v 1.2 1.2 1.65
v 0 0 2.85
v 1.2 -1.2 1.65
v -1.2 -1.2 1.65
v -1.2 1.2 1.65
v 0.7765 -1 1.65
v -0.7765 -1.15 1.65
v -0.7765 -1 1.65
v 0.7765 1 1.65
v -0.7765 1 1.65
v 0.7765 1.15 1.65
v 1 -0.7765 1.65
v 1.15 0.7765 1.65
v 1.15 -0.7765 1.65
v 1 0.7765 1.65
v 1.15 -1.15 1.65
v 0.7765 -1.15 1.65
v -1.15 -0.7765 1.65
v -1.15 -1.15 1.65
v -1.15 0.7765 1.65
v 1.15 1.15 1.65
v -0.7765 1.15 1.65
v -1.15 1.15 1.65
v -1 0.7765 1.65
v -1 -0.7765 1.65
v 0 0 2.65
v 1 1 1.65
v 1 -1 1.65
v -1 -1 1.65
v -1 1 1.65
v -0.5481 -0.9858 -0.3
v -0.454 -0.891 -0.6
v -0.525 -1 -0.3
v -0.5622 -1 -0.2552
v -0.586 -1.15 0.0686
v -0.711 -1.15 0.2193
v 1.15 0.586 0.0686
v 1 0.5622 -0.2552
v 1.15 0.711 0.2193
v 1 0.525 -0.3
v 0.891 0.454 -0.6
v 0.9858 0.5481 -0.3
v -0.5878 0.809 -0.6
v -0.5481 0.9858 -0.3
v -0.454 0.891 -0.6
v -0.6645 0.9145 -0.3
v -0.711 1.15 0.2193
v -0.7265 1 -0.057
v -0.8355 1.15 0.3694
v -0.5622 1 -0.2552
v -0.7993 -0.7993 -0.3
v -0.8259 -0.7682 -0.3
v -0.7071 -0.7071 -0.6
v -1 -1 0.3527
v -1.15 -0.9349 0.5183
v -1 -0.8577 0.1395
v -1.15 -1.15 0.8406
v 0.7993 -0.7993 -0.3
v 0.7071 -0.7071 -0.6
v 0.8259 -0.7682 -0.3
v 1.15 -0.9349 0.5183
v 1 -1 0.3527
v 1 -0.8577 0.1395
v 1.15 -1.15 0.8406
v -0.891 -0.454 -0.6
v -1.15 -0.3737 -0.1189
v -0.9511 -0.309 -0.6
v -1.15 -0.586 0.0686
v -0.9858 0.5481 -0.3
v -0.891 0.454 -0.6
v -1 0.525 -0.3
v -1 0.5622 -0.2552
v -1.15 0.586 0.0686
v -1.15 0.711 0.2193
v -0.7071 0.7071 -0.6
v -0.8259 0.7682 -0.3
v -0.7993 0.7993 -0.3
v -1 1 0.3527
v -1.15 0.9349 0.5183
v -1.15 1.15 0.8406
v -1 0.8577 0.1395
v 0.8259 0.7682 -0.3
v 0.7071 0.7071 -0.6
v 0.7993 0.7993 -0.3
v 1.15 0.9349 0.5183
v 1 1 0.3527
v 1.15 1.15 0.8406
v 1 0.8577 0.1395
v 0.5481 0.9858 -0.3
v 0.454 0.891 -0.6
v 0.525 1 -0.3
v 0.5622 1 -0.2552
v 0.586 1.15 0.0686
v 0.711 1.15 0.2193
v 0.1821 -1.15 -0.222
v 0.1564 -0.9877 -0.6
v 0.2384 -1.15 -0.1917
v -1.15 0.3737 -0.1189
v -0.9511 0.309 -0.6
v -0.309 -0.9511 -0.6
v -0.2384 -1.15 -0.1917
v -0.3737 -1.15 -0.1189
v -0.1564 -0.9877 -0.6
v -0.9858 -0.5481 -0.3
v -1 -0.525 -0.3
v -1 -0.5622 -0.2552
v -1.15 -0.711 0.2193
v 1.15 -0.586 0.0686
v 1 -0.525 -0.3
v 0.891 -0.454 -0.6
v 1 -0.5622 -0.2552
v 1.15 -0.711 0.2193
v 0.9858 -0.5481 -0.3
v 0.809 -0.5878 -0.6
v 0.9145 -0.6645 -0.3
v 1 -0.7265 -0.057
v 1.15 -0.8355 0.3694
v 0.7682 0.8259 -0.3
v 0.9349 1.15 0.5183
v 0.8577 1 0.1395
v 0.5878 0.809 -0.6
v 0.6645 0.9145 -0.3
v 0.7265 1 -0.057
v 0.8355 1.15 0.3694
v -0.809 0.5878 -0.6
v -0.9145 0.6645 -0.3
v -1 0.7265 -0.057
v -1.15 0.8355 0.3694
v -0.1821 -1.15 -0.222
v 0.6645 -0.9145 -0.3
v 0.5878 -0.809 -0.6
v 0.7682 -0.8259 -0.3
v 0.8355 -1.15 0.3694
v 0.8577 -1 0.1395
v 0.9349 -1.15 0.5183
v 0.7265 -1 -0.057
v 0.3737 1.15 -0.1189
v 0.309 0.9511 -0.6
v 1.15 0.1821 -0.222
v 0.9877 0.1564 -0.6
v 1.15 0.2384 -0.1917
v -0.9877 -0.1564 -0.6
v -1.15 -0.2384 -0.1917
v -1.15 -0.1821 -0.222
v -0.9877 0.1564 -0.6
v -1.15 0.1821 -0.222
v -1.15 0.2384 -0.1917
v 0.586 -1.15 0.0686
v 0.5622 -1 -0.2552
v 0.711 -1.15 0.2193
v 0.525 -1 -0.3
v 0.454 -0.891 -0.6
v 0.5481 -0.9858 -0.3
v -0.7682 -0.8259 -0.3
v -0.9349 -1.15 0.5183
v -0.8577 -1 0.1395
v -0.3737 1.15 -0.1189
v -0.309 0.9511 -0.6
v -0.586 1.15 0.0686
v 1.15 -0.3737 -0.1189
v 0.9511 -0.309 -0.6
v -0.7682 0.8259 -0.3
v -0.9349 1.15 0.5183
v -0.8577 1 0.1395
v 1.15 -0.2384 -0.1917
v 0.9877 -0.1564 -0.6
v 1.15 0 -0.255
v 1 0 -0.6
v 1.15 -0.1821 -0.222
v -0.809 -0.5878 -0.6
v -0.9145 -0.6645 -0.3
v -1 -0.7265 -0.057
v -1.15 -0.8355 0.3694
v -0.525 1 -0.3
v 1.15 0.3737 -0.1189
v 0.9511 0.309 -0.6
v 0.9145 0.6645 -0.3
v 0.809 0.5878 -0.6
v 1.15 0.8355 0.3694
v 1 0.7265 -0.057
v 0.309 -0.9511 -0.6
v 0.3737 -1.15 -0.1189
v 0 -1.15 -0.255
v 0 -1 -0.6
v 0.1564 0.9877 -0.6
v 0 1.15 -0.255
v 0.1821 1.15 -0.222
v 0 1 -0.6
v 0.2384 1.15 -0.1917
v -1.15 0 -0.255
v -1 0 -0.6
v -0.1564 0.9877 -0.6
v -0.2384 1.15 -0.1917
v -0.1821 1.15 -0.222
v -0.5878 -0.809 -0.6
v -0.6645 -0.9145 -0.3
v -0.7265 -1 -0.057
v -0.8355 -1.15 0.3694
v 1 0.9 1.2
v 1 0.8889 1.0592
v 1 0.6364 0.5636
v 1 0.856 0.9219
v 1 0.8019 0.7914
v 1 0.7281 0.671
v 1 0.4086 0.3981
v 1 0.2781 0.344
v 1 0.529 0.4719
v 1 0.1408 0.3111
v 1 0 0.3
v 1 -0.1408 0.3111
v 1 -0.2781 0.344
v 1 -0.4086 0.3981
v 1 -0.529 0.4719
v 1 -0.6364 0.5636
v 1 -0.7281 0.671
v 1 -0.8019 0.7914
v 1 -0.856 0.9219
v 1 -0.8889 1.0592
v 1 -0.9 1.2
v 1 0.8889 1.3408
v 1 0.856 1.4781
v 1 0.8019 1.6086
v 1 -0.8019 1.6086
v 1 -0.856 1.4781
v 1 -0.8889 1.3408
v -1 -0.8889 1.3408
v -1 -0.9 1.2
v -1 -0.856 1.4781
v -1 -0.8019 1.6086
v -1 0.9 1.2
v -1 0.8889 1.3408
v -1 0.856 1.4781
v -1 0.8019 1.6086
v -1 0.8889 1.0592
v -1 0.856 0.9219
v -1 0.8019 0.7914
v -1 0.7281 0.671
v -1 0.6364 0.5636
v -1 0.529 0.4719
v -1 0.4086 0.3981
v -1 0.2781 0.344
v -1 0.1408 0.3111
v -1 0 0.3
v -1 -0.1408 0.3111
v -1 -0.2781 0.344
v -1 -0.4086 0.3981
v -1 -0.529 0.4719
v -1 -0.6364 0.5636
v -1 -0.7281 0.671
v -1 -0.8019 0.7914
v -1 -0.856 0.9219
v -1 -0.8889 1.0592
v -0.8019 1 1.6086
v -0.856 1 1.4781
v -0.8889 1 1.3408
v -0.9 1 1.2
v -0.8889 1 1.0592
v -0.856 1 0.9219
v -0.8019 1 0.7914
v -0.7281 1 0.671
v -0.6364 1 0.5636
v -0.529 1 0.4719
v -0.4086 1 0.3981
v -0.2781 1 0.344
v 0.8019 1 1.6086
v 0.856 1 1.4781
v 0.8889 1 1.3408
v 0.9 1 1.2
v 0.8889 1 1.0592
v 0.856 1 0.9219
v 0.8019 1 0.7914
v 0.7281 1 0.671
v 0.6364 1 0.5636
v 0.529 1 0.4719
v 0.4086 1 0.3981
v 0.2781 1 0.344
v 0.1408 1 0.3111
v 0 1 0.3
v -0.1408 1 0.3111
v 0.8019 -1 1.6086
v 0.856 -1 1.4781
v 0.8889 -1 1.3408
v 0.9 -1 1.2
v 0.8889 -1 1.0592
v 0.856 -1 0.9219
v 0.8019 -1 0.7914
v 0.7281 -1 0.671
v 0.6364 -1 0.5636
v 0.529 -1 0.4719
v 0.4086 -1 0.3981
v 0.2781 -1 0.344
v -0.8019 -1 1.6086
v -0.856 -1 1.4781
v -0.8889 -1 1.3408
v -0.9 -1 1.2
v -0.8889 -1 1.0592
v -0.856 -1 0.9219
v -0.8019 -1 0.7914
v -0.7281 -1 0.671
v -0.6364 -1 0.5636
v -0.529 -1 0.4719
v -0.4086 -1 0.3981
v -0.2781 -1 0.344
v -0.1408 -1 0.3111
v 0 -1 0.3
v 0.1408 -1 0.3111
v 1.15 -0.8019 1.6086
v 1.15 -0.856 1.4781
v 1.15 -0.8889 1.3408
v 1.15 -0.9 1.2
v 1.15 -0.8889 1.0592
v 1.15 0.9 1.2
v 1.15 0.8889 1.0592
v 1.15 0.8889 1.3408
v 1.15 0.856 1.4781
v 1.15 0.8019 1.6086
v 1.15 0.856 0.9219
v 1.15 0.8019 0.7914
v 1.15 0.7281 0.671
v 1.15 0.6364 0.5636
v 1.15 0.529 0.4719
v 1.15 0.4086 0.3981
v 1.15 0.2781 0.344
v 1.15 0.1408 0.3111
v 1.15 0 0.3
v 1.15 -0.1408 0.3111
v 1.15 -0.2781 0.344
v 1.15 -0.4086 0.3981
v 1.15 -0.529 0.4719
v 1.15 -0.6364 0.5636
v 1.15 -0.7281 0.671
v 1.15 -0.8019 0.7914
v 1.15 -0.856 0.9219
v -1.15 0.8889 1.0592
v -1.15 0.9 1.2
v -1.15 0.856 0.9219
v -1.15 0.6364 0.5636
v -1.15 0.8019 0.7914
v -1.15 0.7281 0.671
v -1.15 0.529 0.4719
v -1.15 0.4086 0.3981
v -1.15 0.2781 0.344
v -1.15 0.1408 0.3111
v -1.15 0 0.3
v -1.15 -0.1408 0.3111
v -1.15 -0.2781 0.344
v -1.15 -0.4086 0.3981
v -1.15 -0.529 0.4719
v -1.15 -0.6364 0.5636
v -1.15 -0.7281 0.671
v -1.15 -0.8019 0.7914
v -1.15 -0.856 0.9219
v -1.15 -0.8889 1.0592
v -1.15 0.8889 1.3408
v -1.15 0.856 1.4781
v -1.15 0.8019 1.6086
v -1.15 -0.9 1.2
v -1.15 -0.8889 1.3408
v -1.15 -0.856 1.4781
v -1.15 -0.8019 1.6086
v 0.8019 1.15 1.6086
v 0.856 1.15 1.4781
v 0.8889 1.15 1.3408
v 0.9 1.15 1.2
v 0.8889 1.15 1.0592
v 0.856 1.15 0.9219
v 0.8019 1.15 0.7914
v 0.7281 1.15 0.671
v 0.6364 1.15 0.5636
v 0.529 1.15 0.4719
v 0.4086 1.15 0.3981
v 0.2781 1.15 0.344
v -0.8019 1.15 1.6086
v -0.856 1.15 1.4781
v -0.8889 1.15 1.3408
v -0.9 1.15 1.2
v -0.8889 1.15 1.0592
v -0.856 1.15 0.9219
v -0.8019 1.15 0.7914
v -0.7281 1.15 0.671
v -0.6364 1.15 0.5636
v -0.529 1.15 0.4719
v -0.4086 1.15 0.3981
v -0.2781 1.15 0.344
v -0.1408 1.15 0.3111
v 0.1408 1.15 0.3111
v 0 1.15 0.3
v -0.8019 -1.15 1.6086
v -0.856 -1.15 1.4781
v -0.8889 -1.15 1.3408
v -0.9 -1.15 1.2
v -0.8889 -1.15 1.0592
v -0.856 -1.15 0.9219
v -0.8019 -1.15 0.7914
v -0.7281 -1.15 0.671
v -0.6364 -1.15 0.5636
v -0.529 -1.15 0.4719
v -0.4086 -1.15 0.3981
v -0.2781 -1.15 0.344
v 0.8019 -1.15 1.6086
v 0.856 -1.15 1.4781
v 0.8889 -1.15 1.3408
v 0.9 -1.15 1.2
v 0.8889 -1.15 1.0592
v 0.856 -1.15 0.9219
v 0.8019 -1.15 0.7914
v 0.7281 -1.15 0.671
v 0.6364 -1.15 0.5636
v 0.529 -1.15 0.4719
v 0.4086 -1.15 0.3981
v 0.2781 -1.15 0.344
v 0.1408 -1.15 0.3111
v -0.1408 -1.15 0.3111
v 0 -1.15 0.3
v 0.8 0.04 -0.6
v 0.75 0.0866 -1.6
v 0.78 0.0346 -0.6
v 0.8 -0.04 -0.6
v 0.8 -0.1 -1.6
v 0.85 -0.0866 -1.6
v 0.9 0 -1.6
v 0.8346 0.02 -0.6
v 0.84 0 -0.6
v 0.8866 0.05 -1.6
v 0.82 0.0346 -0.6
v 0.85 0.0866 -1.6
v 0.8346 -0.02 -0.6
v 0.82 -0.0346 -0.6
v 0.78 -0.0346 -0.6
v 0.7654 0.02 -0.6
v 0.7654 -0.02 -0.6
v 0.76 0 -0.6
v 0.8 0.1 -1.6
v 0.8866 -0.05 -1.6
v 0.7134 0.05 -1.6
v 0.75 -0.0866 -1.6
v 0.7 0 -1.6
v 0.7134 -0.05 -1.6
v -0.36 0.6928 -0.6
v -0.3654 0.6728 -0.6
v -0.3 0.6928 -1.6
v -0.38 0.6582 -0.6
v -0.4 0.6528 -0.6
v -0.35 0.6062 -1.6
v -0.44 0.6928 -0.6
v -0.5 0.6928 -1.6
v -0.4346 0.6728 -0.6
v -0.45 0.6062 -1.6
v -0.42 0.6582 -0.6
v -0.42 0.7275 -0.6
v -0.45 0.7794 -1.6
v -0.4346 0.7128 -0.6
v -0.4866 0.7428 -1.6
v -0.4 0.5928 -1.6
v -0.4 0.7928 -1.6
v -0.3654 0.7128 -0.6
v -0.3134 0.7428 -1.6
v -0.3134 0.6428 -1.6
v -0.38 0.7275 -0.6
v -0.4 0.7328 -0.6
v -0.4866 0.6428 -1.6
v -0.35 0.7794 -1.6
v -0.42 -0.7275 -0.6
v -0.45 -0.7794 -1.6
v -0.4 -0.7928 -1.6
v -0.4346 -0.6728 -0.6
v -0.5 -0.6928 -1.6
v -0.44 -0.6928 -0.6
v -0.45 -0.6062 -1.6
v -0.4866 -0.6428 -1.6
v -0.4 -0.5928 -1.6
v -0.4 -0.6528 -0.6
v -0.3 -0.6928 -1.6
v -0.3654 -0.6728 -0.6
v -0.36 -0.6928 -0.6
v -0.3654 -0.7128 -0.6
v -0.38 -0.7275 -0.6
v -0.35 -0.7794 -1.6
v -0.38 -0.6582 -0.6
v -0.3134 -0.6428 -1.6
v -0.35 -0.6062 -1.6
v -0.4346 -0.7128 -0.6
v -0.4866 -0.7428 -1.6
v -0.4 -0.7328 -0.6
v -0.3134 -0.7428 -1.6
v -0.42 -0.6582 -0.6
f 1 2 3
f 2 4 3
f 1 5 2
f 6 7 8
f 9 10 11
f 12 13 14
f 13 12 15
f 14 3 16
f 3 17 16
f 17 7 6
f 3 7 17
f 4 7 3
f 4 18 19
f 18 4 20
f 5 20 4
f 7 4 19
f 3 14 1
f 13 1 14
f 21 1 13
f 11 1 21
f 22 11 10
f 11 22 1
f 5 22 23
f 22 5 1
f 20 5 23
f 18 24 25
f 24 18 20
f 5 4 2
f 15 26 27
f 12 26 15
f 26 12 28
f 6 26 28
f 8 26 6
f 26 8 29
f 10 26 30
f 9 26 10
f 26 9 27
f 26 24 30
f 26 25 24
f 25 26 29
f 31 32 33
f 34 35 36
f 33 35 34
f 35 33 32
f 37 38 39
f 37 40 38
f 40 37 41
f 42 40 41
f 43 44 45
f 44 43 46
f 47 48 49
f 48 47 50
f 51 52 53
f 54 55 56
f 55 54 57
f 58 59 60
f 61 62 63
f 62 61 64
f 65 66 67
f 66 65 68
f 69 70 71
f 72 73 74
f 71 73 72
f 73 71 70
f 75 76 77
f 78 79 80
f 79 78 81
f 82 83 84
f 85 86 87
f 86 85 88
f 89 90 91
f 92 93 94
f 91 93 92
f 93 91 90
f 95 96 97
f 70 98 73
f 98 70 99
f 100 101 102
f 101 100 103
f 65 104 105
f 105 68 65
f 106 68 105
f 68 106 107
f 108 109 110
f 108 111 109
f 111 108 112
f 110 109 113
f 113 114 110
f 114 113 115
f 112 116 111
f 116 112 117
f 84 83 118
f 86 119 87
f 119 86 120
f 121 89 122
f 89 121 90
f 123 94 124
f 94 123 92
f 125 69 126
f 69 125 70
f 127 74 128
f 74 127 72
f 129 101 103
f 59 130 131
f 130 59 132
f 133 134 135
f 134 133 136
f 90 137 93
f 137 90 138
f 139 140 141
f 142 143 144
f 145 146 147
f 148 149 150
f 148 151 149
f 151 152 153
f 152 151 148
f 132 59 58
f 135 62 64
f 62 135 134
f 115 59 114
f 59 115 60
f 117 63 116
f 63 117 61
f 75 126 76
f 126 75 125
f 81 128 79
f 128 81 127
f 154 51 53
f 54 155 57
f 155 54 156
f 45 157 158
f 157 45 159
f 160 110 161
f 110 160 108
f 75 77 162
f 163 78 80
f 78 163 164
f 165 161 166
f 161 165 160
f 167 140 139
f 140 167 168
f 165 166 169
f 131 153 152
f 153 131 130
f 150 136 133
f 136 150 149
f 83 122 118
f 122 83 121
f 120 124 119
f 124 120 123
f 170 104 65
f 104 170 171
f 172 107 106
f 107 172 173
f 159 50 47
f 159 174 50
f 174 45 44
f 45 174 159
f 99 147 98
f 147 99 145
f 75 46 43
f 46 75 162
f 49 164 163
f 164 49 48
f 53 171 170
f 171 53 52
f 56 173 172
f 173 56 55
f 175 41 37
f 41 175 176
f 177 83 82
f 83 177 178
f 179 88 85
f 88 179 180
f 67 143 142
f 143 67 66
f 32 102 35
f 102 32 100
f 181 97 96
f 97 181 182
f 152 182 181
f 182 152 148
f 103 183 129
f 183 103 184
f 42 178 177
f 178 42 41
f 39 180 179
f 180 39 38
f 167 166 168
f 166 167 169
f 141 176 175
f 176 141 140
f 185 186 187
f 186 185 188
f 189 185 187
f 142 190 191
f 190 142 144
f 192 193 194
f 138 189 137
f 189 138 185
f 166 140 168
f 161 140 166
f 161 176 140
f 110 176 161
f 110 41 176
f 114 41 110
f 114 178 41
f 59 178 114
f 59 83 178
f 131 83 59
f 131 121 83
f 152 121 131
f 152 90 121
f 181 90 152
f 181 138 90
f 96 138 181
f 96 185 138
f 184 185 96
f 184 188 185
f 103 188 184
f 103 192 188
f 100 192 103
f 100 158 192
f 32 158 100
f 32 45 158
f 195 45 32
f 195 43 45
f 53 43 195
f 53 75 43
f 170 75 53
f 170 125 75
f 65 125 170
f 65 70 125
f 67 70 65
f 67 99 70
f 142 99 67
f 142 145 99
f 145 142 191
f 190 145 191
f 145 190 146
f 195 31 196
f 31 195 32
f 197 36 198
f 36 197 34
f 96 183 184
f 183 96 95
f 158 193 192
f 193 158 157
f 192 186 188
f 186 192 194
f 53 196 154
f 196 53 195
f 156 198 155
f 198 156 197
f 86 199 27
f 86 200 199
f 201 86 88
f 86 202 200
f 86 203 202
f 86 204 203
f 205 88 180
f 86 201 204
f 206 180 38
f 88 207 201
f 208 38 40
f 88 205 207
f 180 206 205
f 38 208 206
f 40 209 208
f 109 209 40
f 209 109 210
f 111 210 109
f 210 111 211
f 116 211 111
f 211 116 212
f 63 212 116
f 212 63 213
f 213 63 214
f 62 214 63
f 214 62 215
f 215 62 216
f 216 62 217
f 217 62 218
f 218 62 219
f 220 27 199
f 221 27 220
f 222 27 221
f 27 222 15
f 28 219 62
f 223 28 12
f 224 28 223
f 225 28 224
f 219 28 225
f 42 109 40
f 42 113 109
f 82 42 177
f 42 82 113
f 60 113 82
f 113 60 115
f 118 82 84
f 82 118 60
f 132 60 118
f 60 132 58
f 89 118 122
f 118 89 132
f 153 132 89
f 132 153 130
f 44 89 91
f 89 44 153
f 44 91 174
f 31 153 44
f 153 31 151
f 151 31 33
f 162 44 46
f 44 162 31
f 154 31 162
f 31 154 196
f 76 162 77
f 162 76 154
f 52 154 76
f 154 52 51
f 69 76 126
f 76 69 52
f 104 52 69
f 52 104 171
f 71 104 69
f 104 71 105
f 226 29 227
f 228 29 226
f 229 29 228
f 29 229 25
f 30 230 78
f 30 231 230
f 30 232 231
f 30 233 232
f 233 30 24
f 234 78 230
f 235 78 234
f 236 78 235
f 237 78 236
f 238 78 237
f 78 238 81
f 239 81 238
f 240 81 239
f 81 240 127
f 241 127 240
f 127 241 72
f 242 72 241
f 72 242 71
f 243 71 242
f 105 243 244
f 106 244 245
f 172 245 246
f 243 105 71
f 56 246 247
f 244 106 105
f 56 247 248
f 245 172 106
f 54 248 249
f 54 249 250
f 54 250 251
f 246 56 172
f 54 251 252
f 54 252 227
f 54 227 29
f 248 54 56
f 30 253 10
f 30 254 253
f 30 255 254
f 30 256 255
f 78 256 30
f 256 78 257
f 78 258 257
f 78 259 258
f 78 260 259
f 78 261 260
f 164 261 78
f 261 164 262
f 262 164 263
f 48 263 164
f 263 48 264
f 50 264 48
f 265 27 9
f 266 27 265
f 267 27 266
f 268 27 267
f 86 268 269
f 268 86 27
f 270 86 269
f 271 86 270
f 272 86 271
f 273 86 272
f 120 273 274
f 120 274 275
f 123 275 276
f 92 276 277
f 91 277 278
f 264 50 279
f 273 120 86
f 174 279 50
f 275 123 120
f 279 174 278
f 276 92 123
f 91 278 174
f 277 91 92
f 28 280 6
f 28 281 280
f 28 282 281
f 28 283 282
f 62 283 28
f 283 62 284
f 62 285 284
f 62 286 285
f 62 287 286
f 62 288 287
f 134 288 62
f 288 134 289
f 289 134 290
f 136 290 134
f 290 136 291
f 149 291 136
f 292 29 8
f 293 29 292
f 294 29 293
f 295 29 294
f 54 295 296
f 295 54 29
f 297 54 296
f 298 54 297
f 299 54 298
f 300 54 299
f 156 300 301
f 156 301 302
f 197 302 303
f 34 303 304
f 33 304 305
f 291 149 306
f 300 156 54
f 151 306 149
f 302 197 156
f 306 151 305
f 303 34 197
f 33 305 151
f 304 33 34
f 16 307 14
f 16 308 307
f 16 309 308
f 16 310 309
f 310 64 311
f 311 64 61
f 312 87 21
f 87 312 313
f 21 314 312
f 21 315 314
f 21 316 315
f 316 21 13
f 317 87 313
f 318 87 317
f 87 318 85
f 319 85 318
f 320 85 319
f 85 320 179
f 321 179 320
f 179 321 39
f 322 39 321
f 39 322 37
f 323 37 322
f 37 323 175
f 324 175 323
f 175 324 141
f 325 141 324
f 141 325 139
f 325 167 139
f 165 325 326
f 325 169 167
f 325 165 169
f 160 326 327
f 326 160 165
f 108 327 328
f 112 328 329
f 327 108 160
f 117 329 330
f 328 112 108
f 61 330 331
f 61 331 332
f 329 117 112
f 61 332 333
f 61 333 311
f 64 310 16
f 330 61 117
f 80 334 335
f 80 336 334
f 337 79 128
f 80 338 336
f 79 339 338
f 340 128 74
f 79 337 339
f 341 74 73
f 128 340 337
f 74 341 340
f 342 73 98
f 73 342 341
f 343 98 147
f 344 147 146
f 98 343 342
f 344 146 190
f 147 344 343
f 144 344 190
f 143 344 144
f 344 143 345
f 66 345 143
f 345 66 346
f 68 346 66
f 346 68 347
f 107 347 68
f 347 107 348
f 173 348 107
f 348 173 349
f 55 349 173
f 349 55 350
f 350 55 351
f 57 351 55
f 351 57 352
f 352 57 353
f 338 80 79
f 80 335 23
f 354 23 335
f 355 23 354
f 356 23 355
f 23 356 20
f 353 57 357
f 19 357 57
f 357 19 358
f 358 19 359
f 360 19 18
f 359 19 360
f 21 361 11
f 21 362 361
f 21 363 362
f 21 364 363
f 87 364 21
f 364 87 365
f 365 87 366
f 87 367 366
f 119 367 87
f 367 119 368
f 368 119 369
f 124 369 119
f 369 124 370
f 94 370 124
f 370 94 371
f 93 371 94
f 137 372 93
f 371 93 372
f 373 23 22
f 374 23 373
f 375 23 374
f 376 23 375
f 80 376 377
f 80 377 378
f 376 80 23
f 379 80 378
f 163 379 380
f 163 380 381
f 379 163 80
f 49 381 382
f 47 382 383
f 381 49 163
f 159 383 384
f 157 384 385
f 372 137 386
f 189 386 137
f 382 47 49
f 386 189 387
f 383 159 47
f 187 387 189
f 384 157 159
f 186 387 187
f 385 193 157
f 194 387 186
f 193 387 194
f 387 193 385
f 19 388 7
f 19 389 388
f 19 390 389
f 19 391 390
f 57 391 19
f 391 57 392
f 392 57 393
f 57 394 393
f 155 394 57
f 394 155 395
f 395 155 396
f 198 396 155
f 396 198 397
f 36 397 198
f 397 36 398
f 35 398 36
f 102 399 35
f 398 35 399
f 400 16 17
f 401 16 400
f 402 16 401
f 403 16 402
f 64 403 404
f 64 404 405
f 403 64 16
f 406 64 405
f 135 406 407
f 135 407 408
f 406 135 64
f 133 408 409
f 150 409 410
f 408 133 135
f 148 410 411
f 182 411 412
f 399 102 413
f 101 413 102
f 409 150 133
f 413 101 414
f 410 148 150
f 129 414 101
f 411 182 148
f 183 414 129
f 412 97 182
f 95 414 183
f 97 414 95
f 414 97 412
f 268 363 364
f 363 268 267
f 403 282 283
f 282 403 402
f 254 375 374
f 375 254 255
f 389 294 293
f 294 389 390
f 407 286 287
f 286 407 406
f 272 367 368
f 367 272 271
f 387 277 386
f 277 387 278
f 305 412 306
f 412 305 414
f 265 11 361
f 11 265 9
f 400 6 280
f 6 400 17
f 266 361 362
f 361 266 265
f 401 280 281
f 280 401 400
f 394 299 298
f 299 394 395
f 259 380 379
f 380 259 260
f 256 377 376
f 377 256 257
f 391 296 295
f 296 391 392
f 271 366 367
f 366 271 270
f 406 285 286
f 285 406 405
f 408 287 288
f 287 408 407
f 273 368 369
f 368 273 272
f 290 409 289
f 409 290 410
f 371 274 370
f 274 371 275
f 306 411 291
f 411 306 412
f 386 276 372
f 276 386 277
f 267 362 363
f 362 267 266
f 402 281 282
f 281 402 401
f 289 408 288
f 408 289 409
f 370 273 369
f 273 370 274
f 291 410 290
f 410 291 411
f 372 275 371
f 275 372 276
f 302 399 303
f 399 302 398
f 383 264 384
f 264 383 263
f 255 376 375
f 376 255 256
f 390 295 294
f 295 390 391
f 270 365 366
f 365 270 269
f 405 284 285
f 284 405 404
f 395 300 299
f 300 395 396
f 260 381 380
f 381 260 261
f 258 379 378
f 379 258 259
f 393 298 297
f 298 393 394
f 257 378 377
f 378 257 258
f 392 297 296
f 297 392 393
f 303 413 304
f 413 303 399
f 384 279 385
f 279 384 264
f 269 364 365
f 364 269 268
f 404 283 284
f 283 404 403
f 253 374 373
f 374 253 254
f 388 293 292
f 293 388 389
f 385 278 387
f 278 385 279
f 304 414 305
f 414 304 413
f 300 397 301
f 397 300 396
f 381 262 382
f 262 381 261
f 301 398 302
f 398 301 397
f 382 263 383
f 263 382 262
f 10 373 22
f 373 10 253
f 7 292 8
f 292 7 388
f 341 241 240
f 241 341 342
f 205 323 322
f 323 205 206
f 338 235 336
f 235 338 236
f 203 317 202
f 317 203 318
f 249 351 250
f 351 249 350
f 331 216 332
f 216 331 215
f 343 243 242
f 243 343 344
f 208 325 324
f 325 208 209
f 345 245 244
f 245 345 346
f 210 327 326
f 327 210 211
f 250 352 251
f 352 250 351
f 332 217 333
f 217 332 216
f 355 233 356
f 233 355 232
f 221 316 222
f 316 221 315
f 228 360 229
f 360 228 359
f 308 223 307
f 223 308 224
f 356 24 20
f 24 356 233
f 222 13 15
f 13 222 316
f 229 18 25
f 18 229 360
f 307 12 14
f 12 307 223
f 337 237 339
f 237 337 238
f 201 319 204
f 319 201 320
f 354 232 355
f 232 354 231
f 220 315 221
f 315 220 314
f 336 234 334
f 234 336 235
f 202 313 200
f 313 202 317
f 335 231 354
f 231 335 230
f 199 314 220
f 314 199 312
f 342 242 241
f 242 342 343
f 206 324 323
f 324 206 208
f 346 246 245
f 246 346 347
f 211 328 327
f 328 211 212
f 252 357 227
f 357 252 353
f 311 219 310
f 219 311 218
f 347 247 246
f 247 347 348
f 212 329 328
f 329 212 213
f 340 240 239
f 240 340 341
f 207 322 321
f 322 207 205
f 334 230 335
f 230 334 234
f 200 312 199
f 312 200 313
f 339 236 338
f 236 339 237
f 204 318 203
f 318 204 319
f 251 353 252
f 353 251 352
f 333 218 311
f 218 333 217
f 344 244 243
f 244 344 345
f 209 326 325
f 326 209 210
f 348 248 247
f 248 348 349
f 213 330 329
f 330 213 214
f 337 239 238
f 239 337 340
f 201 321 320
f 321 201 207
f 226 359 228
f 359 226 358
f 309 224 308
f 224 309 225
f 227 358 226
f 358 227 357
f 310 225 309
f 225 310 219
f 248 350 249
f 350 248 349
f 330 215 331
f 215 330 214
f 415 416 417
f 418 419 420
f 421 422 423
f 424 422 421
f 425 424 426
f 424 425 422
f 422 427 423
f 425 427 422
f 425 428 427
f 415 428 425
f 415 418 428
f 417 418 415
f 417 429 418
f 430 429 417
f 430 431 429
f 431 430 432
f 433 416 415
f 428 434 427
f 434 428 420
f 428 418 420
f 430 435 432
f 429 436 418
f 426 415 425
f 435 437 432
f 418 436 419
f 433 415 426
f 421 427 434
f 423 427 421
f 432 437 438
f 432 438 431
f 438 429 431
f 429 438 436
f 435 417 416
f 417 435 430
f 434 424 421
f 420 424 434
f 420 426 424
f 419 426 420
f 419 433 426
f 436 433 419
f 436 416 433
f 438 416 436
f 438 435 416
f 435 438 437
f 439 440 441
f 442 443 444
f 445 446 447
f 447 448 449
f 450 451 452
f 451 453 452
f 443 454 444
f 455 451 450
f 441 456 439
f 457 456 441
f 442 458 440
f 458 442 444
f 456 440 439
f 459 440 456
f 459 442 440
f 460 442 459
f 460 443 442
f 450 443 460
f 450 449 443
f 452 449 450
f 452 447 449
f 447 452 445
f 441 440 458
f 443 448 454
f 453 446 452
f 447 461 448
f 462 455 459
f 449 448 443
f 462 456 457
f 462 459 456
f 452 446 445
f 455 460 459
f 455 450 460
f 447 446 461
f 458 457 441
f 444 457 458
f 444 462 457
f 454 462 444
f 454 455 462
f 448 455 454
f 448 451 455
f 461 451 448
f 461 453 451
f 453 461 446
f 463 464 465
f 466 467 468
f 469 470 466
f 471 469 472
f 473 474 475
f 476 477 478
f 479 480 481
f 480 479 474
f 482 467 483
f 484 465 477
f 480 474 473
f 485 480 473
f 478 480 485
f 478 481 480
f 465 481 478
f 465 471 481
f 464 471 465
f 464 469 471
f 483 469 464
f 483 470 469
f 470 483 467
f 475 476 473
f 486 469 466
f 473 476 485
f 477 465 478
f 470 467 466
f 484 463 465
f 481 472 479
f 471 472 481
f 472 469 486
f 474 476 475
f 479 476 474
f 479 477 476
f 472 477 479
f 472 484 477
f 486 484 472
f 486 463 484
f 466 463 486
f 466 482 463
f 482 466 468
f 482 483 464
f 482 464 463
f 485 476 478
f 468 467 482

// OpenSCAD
module pyramid() {
    polyhedron(
        points=[ [1,1,0],[1,-1,0],[-1,-1,0],[-1,1,0],[0,0,1]  ],
        faces=[ [0,1,4],[1,2,4],[2,3,4],[3,0,4],[1,0,3],[2,1,3] ]
    );
}

union() {
    translate([0,0,1.65])
        difference() {
            scale(1.2) pyramid();
            pyramid();
        }
    translate([0,0,-0.3])
        difference() {
            intersection() {
                translate([-1.15,-1.15,-2])
                    cube([2.3,2.3,5], $fn=40);
                difference() {
                    translate([0,0,-.3])
                        cylinder(h=2.3, r1=1, r2=2, $fn=40);
                    translate([-1,-1,0])
                        cube([2,2,2], $fn=40);
                }
            }
            union() {
                translate([0,2.5,1.5])
                    rotate(90, [1,0,0])
                        cylinder(h=5, r1=0.9, r2=0.9, $fn=40);
                translate([-2.5,0,1.5])
                    rotate(90, [0,1,0])
                        cylinder(h=5, r1=0.9, r2=0.9, $fn=40);
            }
        }
    for (i = [0:2]) {
        rotate(i*120, [0,0,1])
            translate([0.8,0,-1.6])
                cylinder(h=1, r1=0.1, r2=0.04, $fn=12);
    }
}
